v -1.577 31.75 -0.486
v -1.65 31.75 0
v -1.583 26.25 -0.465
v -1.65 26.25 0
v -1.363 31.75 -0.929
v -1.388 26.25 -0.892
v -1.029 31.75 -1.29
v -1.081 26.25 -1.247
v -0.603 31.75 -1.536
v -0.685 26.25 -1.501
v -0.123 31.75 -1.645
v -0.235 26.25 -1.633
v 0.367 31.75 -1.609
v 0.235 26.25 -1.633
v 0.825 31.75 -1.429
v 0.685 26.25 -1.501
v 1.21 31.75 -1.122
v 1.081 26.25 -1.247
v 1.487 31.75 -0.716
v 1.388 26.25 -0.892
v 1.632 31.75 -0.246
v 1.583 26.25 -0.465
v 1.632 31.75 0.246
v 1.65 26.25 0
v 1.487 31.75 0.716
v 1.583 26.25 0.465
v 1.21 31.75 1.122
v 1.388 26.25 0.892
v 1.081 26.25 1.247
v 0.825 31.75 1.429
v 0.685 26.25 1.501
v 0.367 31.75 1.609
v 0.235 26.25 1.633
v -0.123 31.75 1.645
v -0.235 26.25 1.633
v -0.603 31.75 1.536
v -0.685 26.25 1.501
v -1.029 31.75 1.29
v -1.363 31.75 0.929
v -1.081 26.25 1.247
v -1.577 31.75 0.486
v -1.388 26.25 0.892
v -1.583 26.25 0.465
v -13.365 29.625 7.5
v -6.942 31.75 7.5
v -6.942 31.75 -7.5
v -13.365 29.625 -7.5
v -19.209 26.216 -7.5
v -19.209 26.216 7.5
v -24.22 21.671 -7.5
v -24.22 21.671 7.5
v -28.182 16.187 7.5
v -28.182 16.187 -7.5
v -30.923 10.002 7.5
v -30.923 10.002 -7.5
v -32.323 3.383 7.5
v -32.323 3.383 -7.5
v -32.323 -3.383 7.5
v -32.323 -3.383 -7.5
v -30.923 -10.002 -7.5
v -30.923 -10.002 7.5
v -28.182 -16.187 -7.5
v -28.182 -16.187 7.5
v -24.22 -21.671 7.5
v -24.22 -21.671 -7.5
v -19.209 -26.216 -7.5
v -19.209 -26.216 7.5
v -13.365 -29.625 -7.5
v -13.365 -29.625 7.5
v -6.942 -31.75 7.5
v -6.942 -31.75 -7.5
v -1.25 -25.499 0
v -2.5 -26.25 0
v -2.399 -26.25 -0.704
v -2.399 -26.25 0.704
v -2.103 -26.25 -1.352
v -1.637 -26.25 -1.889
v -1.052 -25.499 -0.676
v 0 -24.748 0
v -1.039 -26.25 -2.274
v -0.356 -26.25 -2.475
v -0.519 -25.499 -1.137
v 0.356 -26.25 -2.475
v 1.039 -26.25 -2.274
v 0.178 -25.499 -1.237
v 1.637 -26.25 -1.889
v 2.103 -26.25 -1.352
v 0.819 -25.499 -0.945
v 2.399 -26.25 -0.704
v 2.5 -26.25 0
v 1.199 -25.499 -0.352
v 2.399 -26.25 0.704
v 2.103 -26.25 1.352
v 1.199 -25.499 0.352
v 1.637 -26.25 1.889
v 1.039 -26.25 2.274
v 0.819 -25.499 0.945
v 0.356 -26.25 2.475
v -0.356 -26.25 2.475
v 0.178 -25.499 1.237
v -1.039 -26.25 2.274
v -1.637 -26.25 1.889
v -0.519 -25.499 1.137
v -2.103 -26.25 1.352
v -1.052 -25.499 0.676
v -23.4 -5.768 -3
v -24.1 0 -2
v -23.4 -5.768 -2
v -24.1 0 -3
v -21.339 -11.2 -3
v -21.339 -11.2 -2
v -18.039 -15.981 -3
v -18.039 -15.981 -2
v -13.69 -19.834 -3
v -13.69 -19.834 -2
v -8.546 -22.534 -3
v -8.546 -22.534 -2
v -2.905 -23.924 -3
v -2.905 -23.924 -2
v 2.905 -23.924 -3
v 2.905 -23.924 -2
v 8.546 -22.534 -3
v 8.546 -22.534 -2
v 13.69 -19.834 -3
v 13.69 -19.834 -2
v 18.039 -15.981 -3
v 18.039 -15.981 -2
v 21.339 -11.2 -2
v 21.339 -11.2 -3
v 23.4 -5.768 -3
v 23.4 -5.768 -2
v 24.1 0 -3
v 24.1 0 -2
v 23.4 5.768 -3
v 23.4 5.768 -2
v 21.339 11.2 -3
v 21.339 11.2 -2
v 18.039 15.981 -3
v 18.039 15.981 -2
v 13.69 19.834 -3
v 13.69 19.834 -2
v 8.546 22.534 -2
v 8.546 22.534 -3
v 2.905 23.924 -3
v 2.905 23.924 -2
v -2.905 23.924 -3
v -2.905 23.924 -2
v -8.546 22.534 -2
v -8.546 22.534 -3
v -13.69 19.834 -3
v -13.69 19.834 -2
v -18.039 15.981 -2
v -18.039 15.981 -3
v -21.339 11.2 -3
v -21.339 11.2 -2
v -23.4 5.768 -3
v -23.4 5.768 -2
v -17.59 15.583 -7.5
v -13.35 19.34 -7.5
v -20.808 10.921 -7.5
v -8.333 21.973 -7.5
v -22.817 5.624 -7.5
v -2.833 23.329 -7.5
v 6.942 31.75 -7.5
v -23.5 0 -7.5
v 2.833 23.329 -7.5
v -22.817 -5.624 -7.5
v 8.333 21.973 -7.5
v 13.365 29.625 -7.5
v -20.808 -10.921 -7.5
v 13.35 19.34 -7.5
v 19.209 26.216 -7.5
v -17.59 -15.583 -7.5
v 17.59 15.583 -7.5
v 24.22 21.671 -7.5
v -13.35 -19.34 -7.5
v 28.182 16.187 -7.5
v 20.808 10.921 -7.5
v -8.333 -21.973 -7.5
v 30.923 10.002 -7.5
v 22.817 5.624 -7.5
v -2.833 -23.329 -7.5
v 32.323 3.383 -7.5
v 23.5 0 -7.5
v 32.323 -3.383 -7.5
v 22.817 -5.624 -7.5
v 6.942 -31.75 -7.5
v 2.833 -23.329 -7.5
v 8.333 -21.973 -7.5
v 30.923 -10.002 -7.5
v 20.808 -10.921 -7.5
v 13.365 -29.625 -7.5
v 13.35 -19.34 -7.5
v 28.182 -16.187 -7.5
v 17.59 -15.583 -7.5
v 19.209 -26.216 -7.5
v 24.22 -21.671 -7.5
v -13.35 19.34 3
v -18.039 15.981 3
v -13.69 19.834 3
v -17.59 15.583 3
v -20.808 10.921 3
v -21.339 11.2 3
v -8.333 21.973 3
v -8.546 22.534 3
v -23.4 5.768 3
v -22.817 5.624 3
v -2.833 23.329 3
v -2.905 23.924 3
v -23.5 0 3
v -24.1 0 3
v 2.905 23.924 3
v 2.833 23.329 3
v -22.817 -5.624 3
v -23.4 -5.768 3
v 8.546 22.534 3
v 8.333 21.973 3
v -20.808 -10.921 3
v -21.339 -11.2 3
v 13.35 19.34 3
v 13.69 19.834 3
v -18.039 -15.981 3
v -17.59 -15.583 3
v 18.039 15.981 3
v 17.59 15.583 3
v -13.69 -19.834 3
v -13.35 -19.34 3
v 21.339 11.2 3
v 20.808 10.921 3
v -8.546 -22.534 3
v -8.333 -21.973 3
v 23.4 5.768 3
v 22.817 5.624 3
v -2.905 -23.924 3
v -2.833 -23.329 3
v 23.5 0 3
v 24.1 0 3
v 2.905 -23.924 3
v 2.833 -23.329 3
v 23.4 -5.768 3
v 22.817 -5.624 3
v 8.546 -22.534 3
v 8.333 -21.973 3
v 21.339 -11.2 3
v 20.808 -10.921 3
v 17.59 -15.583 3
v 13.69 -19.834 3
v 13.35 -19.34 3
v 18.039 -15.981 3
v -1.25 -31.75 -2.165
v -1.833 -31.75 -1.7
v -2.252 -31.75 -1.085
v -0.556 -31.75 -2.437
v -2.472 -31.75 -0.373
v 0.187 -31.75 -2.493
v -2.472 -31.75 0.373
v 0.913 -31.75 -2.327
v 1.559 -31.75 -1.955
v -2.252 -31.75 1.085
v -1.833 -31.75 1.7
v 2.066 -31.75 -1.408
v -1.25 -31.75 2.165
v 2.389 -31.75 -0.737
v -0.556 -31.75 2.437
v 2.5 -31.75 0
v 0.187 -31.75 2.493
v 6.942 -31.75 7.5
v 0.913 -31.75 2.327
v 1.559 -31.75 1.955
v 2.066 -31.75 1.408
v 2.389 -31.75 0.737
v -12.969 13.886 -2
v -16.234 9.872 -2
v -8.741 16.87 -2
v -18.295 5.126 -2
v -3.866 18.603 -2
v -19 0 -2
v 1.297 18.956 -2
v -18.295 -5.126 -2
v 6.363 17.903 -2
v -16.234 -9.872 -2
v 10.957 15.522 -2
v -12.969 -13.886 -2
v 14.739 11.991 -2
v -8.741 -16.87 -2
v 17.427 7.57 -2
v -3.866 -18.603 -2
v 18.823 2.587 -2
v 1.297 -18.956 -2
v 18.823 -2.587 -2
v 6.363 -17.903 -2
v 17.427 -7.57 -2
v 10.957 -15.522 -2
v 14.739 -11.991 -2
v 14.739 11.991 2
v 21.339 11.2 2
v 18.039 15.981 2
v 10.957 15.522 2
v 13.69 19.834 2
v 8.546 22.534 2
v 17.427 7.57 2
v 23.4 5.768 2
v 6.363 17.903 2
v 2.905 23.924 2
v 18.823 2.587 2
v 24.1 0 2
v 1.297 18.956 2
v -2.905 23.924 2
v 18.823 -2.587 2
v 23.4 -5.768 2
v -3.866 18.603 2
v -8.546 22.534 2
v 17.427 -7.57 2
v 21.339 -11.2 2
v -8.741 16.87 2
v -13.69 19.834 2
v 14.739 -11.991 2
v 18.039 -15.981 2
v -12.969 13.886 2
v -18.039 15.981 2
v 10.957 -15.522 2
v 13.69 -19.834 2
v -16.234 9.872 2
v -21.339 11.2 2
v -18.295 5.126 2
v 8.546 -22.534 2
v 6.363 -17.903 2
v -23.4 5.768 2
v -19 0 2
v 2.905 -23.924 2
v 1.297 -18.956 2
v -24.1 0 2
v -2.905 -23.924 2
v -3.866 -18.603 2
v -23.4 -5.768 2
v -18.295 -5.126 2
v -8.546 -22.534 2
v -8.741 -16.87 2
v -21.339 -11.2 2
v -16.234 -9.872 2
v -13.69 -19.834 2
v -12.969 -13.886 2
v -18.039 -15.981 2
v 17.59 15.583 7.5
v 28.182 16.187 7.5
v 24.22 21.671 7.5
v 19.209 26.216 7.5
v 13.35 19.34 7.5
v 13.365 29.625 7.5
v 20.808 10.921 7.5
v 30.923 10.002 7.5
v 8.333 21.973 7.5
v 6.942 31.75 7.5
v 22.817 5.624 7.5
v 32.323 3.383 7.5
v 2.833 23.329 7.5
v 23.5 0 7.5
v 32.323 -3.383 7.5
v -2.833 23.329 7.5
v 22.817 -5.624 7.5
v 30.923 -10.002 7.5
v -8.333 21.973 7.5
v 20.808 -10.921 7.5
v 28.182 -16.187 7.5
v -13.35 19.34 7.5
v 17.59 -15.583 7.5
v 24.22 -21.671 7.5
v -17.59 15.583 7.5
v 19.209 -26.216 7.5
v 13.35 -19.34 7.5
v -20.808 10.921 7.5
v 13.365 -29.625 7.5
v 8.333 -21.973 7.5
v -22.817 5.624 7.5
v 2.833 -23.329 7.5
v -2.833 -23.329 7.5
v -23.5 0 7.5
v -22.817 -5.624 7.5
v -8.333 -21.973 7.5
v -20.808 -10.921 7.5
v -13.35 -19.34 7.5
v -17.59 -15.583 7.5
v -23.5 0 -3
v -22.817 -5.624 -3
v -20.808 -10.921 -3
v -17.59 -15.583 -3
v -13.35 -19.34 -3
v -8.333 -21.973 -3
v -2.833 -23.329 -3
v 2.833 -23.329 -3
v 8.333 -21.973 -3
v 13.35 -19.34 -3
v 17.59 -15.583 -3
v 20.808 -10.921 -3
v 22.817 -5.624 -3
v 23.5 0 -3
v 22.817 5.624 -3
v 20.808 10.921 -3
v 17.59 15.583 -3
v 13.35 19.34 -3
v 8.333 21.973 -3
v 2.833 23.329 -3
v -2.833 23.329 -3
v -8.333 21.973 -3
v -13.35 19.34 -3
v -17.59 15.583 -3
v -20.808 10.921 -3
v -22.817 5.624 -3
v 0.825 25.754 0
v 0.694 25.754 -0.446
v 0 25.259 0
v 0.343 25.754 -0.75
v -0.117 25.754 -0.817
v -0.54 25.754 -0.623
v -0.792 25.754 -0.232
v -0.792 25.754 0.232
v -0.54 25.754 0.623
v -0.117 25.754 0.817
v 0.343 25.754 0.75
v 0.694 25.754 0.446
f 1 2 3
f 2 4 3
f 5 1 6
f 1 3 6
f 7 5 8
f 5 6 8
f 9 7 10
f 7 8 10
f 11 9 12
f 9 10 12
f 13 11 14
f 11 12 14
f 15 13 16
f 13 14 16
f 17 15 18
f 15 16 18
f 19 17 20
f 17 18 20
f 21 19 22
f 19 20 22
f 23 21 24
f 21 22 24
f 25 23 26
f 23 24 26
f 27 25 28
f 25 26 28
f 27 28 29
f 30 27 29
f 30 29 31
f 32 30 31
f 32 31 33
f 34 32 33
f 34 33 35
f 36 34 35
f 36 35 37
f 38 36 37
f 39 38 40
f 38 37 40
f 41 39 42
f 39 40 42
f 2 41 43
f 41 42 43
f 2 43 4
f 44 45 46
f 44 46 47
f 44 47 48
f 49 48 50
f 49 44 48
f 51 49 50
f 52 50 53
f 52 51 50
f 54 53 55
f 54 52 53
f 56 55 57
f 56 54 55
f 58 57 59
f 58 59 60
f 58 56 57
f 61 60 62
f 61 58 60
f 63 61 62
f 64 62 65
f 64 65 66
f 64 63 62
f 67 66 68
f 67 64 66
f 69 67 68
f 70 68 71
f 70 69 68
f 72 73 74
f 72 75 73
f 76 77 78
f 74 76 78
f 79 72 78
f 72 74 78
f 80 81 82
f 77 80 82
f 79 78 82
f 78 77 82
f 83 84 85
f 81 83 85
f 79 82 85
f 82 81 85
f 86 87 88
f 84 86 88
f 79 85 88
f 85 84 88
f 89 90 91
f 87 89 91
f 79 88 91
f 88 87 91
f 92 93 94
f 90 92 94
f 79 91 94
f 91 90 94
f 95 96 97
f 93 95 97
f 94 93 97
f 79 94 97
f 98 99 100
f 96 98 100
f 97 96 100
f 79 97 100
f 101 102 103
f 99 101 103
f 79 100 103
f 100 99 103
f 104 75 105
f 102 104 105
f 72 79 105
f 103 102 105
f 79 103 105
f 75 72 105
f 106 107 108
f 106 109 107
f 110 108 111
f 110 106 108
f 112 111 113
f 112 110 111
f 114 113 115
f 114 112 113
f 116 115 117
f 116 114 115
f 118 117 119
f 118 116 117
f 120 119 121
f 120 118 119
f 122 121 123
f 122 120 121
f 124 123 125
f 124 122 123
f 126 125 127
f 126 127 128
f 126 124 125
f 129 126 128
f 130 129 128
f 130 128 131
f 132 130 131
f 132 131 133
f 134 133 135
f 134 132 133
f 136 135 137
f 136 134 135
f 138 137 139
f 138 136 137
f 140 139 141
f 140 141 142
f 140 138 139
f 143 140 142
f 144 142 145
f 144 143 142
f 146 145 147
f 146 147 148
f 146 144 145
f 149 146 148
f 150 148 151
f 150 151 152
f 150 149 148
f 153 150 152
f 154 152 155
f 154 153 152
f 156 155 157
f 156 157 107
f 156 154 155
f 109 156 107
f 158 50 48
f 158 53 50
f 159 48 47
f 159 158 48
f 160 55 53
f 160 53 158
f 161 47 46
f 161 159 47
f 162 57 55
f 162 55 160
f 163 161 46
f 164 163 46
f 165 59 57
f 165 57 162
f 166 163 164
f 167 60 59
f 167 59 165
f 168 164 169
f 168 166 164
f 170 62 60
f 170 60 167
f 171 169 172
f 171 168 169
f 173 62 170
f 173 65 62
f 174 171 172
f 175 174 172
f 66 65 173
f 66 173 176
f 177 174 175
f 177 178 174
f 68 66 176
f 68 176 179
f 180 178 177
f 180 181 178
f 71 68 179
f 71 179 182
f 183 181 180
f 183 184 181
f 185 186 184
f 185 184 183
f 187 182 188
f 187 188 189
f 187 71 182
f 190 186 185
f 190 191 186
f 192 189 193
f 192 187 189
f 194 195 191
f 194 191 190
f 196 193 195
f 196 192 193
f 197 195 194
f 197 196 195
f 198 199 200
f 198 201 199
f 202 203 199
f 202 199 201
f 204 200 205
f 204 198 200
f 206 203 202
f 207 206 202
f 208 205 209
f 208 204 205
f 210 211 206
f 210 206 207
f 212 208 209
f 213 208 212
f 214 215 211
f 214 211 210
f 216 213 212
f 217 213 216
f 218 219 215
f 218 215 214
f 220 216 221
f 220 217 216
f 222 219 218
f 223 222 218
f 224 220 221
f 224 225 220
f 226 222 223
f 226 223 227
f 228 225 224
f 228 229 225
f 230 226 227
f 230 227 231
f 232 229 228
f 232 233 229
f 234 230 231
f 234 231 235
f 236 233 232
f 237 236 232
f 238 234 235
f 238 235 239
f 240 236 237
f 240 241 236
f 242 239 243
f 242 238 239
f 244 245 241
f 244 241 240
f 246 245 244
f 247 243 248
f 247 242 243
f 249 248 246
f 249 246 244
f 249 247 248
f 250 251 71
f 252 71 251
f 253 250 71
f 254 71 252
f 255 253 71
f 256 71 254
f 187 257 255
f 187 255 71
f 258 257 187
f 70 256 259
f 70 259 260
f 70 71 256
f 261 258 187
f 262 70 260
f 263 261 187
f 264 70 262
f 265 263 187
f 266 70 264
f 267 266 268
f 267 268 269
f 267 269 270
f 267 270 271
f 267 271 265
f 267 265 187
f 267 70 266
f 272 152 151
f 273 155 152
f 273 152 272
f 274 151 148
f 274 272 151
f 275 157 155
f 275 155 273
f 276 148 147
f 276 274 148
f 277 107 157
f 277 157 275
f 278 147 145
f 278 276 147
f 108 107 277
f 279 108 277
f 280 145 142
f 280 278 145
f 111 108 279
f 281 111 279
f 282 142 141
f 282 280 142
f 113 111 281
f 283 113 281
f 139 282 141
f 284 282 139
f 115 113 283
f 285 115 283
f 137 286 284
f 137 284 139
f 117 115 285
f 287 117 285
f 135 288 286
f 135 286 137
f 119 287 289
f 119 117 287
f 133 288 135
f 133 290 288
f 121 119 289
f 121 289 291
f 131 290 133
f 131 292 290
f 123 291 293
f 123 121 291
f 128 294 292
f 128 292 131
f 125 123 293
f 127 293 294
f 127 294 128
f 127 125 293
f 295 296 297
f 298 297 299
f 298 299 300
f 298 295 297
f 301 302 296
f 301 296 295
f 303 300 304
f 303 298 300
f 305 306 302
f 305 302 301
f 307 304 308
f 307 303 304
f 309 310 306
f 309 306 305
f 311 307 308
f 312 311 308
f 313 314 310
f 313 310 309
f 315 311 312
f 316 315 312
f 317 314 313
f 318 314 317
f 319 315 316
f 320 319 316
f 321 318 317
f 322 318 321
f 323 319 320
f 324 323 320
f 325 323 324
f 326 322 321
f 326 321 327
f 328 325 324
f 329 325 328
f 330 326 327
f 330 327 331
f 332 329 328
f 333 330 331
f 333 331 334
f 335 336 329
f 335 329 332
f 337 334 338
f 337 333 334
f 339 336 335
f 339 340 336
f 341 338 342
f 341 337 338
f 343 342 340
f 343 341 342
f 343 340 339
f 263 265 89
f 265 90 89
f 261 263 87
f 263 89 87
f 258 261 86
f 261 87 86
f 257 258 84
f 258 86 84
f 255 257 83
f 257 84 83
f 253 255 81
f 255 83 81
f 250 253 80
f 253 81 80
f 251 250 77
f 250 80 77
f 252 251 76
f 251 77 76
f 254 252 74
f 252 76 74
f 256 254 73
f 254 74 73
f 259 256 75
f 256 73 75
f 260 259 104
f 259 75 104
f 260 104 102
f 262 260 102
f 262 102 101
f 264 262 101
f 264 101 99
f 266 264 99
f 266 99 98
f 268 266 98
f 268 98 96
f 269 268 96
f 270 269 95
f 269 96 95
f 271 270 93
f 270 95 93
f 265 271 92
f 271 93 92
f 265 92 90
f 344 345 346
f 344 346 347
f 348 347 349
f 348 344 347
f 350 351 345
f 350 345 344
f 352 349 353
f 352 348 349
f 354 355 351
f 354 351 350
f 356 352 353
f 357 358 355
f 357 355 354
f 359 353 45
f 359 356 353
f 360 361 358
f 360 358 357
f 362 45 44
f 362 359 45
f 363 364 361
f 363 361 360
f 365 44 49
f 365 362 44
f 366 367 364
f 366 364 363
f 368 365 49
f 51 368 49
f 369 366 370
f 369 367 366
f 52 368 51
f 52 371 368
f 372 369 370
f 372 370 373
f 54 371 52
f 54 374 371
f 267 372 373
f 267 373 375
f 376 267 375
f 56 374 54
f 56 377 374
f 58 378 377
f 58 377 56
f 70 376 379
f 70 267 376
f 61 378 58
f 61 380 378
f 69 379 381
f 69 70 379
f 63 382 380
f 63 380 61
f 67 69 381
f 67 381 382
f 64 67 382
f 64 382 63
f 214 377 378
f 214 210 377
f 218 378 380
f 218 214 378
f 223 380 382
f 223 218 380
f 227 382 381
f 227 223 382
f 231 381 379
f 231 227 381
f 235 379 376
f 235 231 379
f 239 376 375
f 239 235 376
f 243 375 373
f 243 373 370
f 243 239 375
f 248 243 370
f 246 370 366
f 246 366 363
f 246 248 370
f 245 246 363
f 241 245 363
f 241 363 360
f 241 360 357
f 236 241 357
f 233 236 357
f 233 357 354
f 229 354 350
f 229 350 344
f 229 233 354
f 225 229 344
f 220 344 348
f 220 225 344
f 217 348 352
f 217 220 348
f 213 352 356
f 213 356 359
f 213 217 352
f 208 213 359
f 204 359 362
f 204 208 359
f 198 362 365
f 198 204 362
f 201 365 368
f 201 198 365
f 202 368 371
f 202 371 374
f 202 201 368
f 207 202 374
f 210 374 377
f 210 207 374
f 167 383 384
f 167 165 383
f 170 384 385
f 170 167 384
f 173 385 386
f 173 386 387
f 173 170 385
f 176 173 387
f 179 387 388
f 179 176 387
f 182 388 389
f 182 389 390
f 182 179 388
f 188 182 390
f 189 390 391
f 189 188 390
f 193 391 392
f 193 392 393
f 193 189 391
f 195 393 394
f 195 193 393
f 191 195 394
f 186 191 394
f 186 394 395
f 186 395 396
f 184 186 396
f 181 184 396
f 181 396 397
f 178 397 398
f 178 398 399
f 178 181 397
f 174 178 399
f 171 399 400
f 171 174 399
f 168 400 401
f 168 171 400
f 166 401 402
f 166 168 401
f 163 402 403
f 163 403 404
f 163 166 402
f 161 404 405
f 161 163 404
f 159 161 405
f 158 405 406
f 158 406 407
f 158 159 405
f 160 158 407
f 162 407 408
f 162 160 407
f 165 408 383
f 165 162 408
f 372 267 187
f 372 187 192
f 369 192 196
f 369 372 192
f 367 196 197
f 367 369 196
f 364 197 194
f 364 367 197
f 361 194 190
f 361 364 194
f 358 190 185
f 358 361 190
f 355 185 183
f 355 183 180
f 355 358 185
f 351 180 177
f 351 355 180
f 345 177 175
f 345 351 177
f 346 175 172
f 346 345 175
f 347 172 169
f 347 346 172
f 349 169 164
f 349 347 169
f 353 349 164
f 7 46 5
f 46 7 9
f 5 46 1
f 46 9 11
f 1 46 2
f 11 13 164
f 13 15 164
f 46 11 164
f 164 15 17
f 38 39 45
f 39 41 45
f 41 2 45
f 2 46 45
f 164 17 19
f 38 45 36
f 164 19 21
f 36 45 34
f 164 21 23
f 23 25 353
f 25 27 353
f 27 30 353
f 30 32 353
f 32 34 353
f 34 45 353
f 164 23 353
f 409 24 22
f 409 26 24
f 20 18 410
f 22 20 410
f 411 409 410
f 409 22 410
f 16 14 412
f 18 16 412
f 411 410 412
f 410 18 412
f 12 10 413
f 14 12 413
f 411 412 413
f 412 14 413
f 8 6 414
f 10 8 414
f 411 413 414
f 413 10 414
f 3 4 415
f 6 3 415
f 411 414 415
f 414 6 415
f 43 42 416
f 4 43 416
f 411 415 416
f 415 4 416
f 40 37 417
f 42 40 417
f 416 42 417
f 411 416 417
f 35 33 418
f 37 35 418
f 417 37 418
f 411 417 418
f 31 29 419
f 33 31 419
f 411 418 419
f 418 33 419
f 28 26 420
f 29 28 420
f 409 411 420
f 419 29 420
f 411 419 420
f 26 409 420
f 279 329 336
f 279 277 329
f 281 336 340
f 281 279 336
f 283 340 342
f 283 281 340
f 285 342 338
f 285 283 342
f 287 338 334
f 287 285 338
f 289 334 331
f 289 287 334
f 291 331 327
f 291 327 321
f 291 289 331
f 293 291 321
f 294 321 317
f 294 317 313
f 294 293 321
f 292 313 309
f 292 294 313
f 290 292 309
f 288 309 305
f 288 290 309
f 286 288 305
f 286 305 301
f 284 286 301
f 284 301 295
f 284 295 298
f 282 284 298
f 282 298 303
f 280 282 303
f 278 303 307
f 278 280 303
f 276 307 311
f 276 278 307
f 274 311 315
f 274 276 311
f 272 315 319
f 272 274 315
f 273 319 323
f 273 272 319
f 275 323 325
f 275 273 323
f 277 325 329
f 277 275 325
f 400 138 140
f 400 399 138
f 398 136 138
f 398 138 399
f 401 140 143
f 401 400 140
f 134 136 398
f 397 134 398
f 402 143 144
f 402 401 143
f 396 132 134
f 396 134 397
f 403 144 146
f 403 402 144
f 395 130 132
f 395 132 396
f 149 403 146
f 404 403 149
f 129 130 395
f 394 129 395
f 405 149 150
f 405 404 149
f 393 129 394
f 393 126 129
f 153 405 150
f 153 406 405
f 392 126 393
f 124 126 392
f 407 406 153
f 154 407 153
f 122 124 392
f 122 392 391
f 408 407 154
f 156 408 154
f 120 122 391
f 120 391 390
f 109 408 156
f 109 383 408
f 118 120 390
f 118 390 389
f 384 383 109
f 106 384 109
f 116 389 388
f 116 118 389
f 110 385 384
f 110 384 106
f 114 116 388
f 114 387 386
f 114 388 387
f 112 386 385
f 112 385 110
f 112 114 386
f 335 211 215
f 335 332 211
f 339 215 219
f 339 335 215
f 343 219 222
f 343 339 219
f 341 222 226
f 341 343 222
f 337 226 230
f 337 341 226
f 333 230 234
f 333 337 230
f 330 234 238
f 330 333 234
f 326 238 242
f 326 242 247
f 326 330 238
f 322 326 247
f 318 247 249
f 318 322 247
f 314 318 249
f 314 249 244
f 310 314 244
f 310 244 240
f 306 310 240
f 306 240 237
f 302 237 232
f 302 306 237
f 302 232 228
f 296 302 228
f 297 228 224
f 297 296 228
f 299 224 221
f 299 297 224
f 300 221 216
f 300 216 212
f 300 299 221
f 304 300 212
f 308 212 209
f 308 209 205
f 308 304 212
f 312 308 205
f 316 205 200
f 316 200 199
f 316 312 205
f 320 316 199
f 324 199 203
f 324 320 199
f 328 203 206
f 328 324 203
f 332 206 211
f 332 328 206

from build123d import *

# Parameters (mm, degrees)
SKETCH_2_W             = 64.02174429
SKETCH_2_H             = 9.248919907
CUT_EXTRUDE_1_DEPTH    = 49
HOLE_WIZARD_M4_2_D     = 3.3
HOLE_WIZARD_M4_2_DEPTH = 5.5
HOLE_WIZARD_M4_2_TIP   = 0.991420021
HOLE_WIZARD_M6_2_D     = 5
HOLE_WIZARD_M6_2_DEPTH = 5.5
HOLE_WIZARD_M6_2_TIP   = 1.502151548


with BuildPart() as part:
    # 草图1 → 旋转1 (revolve)
    with BuildSketch(Plane(origin=(0, 0, 0), x_dir=(1, 0, 0), z_dir=(0, 1, 0)), mode=Mode.PRIVATE) as revolve_1_sk:
        Polygon((32.5, 7.5), (32.5, -7.5), (23.5, -7.5), (23.5, -3), (24.1, -3), (24.1, -2), (19, -2), (19, 2), (24.1, 2), (24.1, 3), (23.5, 3), (23.5, 7.5), align=None)
    revolve(revolve_1_sk.sketch.rotate(Axis((0, 0, -31.9390681), (0, 0, 1)), 180), axis=Axis((0, 0, -31.9390681), (0, 0, 1)))  # turned: the seam where the file's is

    # 草图2 → 切除-拉伸1 (cut)
    with BuildSketch(Plane.XY.offset(7.5)):
        with Locations((-1.141100508, 36.374459954)):
            Rectangle(SKETCH_2_W, SKETCH_2_H)
        with Locations((-1.141100508, -36.374459954)):
            Rectangle(SKETCH_2_W, SKETCH_2_H)
    extrude(amount=-CUT_EXTRUDE_1_DEPTH, mode=Mode.SUBTRACT)

    # M4 螺纹孔2
    with Locations(Plane(origin=(0, 31.75, 0), x_dir=(1, 0, 0), z_dir=(0, 1, 0))):
        with Locations((0, 0)):
            Hole(HOLE_WIZARD_M4_2_D / 2, depth=HOLE_WIZARD_M4_2_DEPTH)
            with Locations((0, 0, -(HOLE_WIZARD_M4_2_DEPTH + HOLE_WIZARD_M4_2_TIP / 2))):  # 118° drill point
                Cone(0, HOLE_WIZARD_M4_2_D / 2, HOLE_WIZARD_M4_2_TIP, mode=Mode.SUBTRACT)

    # M6 螺纹孔2
    with Locations(Plane(origin=(0, -31.75, 0), x_dir=(-1, 0, 0), z_dir=(0, -1, 0))):
        with Locations((0, 0)):
            Hole(HOLE_WIZARD_M6_2_D / 2, depth=HOLE_WIZARD_M6_2_DEPTH)
            with Locations((0, 0, -(HOLE_WIZARD_M6_2_DEPTH + HOLE_WIZARD_M6_2_TIP / 2))):  # 118° drill point
                Cone(0, HOLE_WIZARD_M6_2_D / 2, HOLE_WIZARD_M6_2_TIP, mode=Mode.SUBTRACT)


solid = part.part
